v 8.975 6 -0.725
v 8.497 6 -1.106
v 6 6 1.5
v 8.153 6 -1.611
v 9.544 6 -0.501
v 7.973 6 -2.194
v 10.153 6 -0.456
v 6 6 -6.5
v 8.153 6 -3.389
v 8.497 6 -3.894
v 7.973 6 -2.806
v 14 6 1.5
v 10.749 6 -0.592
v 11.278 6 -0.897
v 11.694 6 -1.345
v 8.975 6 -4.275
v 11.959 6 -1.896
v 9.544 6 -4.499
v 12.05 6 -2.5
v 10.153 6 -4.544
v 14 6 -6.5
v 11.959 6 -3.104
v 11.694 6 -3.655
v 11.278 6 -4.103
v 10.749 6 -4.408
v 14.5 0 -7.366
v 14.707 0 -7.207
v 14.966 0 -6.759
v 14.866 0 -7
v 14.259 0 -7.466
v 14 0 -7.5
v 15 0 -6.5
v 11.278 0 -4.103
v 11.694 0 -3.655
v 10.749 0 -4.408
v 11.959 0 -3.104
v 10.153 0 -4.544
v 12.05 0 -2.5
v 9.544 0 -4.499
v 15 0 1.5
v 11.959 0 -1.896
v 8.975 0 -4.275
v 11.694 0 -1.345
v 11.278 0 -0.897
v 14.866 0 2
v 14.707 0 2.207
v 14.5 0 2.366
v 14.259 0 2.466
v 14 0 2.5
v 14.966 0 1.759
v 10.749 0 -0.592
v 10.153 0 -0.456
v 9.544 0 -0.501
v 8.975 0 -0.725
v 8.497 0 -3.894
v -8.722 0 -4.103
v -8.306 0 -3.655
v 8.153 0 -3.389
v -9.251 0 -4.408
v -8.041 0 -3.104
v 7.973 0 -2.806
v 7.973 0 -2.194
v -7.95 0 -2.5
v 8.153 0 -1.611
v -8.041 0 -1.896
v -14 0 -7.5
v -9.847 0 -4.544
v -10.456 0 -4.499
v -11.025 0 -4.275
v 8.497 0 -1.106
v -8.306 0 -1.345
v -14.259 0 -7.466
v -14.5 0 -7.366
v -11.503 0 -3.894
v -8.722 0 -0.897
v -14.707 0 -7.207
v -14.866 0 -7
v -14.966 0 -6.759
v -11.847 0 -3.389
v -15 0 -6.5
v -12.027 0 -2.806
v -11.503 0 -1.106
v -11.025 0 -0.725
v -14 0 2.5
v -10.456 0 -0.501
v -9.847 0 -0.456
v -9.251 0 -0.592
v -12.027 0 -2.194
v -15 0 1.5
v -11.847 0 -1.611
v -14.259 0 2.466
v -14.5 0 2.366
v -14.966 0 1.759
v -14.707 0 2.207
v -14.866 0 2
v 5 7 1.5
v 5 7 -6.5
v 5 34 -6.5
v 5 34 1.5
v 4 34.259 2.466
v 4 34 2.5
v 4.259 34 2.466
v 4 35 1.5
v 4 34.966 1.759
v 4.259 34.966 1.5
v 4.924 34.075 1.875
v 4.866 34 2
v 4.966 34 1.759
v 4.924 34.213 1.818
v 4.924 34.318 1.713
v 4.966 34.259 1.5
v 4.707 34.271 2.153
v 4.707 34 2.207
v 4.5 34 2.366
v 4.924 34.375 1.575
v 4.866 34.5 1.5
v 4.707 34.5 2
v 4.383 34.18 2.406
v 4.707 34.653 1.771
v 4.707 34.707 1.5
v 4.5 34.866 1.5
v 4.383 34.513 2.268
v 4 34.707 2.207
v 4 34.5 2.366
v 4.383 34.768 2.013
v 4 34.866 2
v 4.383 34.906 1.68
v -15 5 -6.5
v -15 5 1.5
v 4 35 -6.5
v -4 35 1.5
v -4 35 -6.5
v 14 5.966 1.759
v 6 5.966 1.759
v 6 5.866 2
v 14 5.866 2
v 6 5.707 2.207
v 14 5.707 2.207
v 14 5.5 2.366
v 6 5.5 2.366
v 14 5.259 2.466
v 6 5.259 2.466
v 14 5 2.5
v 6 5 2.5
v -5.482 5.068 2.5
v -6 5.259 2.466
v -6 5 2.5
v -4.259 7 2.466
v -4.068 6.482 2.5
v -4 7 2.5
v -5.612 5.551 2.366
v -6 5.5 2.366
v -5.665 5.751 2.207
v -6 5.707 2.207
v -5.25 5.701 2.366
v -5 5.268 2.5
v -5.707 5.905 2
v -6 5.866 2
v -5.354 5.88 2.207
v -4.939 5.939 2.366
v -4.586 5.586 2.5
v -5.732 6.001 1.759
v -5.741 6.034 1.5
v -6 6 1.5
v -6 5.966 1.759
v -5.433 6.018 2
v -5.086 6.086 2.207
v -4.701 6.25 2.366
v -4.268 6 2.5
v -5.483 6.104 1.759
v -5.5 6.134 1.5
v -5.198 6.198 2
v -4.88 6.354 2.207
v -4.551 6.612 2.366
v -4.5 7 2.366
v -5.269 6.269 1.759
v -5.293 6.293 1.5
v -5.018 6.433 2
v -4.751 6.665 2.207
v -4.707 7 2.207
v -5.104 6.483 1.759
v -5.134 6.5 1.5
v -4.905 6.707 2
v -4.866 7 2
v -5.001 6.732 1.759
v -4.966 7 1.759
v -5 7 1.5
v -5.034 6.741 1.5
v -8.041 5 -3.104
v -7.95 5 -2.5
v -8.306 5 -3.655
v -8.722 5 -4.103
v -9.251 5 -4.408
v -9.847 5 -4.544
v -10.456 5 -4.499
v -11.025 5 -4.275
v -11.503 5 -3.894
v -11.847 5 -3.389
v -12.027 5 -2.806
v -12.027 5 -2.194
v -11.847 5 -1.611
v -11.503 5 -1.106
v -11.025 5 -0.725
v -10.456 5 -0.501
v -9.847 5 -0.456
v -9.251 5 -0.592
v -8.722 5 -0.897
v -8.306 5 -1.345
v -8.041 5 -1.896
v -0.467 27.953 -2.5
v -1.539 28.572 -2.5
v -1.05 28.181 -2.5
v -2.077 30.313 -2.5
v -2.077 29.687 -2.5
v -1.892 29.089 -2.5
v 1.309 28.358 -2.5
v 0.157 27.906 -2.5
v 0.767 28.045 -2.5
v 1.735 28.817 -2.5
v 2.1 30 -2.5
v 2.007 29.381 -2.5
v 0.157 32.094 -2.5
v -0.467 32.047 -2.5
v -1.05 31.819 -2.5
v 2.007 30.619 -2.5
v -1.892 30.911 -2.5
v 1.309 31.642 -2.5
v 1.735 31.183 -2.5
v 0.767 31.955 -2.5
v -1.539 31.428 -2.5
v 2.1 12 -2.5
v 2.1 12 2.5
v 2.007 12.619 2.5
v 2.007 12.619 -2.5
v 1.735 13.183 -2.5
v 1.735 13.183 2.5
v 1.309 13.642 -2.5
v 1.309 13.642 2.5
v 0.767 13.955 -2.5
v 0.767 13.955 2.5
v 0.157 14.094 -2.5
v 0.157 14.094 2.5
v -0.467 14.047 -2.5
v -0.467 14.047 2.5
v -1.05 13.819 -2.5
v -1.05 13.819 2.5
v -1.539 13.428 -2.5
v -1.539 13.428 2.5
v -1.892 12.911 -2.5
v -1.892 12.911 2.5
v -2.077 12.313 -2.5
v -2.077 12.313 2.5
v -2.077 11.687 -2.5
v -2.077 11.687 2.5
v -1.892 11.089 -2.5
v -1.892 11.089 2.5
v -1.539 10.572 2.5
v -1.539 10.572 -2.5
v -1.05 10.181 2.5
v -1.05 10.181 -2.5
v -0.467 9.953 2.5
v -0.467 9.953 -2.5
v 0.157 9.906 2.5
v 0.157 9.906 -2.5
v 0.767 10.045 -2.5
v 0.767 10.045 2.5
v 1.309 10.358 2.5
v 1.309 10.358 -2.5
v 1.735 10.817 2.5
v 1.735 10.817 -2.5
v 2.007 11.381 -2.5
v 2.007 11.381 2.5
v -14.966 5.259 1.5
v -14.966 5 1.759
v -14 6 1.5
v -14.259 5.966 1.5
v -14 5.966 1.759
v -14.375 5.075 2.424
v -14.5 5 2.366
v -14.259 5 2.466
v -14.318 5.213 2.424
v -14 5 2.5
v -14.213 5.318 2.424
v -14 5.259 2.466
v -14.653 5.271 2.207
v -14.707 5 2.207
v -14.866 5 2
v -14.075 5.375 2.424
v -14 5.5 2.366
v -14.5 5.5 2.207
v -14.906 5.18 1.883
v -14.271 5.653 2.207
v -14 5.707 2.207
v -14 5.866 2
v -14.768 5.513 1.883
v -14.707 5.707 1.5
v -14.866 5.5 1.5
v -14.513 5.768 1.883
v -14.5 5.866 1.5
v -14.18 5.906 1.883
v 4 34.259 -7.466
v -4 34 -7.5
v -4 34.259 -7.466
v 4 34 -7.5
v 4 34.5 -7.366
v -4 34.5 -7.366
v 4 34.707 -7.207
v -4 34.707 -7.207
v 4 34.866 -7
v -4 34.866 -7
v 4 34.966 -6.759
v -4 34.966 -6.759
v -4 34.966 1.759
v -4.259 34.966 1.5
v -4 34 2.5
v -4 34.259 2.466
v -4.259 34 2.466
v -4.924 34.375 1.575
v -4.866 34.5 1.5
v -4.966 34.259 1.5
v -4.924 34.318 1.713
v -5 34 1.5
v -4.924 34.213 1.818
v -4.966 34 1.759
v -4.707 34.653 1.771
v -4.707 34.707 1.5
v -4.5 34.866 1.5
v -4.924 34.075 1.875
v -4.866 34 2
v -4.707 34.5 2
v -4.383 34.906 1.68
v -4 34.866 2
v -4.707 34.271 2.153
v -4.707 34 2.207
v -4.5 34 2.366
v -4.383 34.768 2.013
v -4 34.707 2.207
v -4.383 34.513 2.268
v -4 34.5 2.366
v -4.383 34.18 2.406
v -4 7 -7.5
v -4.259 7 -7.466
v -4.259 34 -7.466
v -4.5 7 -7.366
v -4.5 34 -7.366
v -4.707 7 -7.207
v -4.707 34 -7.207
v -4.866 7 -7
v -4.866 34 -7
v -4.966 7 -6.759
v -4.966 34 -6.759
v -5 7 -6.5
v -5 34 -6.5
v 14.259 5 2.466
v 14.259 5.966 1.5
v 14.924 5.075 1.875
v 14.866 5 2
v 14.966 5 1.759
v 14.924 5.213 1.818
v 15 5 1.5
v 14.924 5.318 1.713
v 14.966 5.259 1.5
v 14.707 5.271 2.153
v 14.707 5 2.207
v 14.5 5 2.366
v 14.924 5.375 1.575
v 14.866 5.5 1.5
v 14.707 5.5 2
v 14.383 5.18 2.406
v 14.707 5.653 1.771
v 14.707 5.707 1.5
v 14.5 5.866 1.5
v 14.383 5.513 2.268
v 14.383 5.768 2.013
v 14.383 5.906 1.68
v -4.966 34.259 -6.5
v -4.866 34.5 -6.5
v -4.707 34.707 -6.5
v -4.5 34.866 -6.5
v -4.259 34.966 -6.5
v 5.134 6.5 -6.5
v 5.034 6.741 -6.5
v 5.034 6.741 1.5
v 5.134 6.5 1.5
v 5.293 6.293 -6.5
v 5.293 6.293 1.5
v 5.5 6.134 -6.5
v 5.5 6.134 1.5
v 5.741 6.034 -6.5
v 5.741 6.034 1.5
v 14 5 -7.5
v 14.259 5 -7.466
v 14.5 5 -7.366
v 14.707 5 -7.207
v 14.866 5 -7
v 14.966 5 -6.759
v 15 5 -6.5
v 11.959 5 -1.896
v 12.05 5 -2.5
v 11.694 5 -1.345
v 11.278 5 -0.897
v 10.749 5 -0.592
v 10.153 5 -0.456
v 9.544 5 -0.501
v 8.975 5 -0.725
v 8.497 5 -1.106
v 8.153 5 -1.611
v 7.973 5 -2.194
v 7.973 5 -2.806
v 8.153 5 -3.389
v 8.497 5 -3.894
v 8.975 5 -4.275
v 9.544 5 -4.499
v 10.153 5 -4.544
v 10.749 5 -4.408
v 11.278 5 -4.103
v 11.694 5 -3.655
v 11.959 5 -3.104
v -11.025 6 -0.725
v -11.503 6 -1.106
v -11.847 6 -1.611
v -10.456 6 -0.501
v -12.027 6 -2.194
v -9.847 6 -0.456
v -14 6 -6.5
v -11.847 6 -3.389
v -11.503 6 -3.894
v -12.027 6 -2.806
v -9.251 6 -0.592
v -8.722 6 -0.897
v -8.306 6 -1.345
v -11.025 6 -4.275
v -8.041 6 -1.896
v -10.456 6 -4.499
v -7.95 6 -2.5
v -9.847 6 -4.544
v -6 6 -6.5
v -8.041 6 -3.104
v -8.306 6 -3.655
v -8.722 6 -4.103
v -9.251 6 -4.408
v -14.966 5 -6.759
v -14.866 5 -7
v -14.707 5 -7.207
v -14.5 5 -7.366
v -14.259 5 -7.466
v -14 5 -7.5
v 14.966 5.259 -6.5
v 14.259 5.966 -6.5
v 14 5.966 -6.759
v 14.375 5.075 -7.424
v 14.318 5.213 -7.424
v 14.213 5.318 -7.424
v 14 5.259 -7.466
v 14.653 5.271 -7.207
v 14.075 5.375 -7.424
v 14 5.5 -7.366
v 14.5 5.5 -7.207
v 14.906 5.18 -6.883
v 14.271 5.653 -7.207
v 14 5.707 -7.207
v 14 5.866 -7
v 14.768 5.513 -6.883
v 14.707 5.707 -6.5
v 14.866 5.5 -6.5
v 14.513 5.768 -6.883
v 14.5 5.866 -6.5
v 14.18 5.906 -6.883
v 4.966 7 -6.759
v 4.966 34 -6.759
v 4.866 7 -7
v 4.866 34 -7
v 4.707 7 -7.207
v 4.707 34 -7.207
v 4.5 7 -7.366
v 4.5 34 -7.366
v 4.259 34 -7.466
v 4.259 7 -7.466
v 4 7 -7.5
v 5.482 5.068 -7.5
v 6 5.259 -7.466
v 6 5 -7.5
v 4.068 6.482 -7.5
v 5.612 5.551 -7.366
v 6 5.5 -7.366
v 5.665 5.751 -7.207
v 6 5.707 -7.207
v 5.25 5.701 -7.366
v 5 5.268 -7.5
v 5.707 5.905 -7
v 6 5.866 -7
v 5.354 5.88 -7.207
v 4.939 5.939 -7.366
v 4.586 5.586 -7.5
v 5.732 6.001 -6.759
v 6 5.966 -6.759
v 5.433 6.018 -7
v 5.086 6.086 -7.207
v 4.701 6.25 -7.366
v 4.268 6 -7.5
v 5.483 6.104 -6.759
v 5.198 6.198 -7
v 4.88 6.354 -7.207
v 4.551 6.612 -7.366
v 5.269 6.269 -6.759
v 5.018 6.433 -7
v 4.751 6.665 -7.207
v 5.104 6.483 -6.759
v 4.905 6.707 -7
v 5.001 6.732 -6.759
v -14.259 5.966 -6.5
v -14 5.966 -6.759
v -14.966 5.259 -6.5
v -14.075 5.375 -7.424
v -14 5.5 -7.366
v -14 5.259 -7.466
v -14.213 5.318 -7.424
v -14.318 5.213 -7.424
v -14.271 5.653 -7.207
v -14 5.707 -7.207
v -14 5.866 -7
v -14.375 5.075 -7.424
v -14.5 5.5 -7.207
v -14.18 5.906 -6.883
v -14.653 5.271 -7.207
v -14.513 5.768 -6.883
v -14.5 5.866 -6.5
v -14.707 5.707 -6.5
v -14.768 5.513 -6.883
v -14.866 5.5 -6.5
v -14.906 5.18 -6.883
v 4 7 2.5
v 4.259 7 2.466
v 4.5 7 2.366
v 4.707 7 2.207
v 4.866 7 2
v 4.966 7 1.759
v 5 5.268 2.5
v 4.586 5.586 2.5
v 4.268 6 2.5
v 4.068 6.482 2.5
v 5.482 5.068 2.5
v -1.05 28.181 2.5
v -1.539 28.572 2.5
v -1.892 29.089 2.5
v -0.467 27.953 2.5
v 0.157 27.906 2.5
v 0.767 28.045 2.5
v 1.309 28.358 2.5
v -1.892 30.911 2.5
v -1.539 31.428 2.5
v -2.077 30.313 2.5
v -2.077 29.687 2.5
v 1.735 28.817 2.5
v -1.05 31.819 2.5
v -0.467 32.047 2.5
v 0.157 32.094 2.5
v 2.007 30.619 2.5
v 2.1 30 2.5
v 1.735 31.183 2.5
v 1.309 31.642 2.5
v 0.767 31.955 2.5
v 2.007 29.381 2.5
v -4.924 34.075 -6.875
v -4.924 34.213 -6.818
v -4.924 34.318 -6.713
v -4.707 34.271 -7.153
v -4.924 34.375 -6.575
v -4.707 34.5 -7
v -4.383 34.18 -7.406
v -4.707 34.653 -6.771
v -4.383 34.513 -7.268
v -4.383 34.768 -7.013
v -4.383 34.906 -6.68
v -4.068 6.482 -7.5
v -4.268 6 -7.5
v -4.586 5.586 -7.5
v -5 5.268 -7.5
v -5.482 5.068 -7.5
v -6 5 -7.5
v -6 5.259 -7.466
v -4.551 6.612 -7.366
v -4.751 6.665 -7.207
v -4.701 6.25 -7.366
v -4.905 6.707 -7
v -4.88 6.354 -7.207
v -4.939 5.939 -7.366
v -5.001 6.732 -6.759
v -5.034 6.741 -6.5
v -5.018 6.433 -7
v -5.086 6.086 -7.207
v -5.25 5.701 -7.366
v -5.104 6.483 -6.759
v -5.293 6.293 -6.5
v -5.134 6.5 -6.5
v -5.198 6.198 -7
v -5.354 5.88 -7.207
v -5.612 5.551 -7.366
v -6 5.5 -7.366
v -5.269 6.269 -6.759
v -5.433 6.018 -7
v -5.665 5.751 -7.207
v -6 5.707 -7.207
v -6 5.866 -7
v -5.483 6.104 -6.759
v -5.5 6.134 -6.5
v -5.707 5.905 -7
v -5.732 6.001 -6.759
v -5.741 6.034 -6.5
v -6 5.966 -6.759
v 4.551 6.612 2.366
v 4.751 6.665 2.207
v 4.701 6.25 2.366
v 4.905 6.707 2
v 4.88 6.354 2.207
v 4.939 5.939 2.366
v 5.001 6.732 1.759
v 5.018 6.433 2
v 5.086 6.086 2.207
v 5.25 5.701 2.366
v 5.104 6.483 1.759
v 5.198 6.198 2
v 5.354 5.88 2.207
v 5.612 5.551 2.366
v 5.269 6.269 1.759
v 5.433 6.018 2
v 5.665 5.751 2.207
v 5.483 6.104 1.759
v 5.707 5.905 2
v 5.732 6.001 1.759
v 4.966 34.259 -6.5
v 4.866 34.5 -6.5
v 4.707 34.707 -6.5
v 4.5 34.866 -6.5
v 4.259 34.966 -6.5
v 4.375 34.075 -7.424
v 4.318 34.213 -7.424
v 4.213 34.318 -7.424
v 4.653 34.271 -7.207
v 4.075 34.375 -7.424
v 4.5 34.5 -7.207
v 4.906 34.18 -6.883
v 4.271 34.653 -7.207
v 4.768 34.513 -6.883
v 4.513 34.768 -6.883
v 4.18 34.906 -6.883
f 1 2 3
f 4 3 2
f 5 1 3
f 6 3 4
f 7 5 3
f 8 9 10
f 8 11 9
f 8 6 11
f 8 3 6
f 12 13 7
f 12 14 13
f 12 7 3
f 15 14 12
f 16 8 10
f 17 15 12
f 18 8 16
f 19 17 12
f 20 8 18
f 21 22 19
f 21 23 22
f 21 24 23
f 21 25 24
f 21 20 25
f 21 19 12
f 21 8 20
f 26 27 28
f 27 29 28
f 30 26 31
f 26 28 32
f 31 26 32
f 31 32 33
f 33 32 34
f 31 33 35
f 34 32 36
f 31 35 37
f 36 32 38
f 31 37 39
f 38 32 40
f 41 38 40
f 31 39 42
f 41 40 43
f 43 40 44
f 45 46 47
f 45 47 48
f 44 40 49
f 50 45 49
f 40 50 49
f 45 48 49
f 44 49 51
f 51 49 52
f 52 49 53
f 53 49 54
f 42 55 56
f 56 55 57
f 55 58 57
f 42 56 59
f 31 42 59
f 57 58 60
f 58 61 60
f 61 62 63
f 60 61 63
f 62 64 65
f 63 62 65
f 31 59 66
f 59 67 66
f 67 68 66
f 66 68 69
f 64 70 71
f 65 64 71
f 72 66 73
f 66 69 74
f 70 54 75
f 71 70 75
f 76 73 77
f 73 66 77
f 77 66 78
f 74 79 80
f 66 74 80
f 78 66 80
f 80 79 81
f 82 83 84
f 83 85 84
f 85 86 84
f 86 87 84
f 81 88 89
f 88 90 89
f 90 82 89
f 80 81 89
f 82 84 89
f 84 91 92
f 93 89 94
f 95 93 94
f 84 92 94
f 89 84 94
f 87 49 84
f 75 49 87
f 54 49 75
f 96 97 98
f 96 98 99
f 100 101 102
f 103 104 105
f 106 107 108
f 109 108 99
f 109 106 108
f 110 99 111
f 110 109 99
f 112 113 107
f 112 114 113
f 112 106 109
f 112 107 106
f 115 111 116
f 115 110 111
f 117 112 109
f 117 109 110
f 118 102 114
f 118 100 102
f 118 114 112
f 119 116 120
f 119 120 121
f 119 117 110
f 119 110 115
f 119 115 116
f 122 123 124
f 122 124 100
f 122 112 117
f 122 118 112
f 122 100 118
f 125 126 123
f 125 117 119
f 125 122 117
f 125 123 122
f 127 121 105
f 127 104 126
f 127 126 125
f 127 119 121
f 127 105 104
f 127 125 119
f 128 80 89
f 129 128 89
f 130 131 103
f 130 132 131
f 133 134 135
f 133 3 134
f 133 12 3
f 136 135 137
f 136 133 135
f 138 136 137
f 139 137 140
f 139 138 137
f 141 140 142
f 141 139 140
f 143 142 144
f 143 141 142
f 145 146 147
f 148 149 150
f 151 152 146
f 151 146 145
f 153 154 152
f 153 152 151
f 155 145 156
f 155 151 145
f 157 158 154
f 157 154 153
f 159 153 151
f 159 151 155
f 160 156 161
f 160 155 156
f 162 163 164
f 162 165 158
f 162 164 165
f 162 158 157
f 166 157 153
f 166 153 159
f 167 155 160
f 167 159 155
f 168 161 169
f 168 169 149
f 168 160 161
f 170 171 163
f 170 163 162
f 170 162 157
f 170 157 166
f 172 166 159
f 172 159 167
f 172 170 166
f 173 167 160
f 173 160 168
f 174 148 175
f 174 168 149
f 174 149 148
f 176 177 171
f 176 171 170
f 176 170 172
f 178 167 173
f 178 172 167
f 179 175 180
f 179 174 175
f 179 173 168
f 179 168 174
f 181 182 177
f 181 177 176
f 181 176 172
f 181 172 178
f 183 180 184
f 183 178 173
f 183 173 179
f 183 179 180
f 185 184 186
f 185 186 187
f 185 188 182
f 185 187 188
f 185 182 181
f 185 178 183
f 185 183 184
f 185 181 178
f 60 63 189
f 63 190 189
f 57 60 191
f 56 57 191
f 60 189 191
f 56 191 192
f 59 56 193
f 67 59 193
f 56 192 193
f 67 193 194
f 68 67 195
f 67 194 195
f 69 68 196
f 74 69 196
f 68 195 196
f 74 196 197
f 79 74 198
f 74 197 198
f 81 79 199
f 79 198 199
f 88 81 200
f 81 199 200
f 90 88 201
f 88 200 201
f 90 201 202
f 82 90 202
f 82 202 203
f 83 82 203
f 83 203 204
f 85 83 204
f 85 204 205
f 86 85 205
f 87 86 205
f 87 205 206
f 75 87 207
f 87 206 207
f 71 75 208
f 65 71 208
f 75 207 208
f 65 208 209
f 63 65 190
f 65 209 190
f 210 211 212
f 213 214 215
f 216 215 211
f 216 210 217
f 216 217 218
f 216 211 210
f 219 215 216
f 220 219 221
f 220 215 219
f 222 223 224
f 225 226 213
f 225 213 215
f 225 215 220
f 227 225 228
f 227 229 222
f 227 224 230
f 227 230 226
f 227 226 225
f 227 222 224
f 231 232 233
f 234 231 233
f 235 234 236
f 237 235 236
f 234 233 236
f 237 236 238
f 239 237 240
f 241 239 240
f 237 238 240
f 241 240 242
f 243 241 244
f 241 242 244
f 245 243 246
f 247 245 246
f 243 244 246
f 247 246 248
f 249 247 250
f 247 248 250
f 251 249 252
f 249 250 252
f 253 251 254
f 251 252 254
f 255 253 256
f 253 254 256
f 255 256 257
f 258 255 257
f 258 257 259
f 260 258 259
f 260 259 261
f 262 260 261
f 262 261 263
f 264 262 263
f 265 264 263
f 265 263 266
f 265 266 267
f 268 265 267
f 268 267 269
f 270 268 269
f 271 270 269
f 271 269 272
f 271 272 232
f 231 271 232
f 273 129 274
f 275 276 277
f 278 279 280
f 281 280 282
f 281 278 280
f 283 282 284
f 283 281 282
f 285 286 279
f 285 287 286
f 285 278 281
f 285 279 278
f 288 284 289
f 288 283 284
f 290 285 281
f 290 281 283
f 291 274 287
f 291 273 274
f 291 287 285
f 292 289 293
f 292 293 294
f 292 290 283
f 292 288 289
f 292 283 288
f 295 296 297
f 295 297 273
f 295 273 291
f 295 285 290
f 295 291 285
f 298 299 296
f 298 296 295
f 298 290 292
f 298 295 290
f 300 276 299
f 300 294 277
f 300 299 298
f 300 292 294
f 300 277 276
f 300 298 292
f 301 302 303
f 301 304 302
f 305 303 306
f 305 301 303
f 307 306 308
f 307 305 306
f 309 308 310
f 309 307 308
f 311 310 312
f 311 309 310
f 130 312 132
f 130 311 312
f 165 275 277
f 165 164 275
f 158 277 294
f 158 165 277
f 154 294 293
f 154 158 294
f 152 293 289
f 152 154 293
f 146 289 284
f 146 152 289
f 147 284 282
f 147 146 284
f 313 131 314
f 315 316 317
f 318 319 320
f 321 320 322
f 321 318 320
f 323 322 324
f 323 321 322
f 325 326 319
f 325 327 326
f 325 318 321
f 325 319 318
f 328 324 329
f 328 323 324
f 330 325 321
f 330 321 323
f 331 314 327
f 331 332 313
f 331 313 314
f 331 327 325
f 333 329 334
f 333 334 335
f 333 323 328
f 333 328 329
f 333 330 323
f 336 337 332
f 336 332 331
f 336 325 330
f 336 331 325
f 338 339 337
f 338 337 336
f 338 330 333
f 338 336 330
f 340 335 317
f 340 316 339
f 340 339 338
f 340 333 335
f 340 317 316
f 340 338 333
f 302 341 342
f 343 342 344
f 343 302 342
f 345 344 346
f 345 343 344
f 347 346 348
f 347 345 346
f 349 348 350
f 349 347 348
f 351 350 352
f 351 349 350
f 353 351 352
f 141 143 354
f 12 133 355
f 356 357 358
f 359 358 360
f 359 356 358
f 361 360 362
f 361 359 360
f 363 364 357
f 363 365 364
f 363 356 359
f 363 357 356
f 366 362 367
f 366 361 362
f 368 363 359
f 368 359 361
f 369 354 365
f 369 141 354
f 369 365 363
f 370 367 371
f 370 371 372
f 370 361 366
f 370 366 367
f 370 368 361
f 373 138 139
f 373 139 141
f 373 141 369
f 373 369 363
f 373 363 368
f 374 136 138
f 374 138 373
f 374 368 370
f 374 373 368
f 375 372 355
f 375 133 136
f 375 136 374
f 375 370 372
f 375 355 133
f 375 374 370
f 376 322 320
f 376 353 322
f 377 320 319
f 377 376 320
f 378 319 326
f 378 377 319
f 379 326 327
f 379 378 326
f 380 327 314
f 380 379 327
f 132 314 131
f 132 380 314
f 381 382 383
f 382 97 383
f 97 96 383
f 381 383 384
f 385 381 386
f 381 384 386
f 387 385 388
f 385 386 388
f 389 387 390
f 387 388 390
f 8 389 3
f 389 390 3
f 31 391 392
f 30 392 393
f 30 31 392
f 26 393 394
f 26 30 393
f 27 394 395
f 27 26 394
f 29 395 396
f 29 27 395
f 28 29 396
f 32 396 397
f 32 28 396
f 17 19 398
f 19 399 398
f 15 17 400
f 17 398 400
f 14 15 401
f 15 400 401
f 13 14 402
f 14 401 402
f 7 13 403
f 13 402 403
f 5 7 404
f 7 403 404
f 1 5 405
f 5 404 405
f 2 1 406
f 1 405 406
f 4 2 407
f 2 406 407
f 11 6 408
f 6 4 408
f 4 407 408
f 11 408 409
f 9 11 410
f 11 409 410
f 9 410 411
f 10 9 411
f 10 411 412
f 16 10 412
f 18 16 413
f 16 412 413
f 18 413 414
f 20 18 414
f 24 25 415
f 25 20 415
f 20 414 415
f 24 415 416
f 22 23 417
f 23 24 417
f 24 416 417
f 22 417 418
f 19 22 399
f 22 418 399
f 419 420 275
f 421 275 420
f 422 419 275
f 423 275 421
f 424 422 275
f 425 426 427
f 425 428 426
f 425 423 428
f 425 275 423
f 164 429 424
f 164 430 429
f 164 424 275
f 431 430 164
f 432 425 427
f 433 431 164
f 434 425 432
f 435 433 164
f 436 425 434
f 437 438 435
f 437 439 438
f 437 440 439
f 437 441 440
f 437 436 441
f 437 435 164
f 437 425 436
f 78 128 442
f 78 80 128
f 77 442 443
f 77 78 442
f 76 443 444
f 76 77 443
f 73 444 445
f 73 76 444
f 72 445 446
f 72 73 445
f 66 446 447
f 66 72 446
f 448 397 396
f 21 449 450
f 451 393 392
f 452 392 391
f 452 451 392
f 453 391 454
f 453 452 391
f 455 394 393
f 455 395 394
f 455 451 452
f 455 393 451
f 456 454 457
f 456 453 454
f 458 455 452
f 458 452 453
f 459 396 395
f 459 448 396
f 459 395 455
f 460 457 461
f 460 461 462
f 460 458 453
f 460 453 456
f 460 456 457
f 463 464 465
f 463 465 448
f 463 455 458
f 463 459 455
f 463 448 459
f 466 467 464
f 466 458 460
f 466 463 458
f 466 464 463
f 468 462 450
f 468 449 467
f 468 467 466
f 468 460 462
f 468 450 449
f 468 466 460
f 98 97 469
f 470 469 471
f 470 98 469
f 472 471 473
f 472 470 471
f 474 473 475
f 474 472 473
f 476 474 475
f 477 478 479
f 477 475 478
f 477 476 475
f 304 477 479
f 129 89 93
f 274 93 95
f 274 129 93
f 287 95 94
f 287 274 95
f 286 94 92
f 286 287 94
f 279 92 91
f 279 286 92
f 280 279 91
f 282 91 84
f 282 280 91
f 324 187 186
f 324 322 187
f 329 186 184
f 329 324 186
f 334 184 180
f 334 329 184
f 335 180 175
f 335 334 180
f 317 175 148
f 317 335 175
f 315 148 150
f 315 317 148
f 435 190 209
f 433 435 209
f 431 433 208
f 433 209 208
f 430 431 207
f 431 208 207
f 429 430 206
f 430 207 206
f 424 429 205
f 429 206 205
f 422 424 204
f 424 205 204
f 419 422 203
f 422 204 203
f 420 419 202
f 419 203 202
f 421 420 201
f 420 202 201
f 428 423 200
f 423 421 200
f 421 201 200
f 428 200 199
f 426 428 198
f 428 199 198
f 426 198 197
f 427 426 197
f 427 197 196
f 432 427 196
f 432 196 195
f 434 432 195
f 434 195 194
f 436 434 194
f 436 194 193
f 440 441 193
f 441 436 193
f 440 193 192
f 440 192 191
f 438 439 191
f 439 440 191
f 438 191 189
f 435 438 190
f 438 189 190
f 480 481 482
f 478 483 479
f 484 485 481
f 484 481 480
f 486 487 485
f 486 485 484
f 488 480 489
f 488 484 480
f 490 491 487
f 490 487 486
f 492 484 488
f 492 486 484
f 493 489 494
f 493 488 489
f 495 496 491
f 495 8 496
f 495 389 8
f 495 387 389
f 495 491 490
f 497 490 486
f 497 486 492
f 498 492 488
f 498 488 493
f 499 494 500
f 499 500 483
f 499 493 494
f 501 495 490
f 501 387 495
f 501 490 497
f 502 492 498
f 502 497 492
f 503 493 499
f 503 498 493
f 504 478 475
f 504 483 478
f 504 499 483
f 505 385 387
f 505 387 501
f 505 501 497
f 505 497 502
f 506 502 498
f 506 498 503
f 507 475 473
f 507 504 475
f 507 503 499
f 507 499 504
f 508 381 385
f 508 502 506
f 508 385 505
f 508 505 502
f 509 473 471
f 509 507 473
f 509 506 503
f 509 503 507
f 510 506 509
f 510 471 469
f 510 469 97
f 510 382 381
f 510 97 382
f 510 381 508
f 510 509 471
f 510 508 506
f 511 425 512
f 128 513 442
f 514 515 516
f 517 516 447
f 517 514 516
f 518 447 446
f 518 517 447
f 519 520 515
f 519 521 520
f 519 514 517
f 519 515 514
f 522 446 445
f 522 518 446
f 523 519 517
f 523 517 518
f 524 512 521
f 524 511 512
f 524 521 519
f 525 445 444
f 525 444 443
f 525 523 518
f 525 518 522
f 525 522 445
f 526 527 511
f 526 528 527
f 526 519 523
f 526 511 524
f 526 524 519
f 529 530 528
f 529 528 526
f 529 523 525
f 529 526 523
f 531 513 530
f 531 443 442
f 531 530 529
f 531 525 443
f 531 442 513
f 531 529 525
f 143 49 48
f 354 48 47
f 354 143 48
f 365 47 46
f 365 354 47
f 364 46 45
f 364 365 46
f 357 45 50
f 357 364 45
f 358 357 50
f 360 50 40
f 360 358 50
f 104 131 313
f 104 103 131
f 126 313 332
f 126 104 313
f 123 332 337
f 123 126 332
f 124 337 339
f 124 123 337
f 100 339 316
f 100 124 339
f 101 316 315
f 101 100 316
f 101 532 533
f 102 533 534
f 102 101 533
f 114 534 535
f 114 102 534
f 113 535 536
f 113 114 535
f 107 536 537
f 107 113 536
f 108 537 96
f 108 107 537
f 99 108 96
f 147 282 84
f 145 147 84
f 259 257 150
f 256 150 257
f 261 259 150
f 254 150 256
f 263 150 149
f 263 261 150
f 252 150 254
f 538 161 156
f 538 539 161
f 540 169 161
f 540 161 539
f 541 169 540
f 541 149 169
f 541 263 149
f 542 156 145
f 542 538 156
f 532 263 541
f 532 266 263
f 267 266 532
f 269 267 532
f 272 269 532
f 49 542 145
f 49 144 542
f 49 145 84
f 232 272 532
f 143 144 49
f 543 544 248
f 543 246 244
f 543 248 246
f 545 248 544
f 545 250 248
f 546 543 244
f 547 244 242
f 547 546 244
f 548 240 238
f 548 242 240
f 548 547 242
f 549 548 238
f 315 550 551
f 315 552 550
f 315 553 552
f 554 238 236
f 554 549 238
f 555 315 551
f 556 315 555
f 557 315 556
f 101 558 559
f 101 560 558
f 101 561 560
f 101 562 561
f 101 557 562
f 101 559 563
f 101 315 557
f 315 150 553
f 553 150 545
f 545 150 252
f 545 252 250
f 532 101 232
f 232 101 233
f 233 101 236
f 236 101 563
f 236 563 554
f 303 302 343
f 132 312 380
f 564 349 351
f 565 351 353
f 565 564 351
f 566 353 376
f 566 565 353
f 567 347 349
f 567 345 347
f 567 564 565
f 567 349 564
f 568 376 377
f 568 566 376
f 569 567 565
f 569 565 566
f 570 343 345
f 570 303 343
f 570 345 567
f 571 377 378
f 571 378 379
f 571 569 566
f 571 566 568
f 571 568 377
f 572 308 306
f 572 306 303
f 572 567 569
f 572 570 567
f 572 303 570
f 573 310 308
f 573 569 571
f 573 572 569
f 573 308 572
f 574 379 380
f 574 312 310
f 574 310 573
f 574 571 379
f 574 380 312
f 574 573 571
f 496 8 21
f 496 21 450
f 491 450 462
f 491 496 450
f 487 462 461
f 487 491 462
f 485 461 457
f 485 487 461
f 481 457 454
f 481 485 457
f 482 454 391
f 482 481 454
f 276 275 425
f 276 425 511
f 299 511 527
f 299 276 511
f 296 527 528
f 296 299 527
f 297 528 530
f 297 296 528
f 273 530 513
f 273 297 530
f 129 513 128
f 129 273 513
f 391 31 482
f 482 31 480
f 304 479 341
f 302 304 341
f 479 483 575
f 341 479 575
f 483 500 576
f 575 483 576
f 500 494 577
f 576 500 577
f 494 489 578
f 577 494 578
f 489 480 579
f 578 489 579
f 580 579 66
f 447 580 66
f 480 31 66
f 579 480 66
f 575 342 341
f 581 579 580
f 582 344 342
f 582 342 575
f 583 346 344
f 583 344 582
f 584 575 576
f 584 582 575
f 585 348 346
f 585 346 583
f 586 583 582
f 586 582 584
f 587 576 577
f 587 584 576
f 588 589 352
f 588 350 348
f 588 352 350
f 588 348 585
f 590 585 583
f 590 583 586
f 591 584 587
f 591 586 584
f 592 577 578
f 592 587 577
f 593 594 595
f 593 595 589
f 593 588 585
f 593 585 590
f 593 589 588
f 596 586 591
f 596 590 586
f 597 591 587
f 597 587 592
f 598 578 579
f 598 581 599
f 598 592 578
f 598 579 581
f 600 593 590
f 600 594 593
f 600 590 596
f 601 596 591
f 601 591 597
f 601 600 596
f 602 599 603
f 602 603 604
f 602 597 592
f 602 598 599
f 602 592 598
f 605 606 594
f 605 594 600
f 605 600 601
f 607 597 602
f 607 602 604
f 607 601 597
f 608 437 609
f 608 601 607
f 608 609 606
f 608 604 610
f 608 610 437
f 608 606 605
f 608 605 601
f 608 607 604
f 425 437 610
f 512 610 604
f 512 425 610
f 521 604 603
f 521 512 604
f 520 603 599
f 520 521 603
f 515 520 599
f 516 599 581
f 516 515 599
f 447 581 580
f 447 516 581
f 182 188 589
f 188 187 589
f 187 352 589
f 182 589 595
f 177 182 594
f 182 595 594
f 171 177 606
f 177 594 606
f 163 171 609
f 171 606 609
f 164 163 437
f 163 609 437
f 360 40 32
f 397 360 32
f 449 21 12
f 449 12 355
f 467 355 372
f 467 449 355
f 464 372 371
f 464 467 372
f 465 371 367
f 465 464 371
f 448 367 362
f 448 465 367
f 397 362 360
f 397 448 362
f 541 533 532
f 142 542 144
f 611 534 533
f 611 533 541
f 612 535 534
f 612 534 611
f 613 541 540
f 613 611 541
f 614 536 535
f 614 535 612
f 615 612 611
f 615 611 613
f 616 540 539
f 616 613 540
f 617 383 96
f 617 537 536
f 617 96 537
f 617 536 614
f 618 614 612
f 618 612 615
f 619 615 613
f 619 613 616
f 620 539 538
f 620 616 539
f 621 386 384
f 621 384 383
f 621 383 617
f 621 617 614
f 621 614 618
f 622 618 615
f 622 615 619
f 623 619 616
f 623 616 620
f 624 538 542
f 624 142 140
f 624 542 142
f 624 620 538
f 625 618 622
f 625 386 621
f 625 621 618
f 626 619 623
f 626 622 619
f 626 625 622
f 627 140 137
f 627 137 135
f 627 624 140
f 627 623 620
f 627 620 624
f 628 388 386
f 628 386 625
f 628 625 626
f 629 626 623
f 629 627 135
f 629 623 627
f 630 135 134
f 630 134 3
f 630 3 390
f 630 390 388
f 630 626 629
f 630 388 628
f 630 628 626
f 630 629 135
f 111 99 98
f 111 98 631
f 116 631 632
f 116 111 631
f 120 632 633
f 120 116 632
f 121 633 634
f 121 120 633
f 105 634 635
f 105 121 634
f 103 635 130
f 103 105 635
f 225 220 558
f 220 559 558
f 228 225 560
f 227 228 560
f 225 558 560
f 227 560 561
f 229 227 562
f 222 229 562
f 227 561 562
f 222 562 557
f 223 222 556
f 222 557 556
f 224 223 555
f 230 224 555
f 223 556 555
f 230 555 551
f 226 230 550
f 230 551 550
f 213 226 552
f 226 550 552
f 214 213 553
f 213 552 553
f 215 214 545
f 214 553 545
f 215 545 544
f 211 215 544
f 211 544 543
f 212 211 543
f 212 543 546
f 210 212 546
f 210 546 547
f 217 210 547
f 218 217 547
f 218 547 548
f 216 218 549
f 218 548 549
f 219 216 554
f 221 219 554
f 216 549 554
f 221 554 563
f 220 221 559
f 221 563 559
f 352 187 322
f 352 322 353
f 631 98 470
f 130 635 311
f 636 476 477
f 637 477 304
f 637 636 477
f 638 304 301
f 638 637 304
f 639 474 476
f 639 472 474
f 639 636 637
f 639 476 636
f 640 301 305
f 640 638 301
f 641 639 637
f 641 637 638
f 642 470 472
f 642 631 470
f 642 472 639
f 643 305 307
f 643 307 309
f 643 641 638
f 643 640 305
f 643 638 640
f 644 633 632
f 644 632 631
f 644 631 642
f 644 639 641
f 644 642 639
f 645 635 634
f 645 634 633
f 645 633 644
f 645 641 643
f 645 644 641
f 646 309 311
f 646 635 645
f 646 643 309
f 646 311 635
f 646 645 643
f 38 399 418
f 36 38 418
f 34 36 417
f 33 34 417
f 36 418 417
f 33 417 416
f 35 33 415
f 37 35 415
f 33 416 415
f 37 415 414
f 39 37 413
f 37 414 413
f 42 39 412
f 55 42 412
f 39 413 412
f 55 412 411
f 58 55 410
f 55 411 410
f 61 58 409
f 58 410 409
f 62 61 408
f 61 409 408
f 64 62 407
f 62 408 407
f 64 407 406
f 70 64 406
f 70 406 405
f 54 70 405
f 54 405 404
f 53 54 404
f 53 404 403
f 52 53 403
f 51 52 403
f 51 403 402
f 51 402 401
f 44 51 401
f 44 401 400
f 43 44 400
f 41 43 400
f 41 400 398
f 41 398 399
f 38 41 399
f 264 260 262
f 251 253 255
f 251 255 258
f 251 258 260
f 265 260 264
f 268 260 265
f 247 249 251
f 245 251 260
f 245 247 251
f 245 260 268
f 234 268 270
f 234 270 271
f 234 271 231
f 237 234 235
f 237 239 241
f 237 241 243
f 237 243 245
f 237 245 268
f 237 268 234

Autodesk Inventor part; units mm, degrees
ref_plane "YZ Plane" through (0, 0, 0) normal (1, 0, 0) x (0, 1, 0)
ref_plane "XZ Plane" through (0, 0, 0) normal (0, 1, 0) x (-1, 0, 0)
ref_plane "XY Plane" through (0, 0, 0) normal (0, 0, 1) x (1, 0, 0)
sketch "Sketch1" plane through (0, 0, 0) normal (0, 1, 0) x (-1, 0, 0)
  line L0 (15, 7.5) -> (-15, 7.5)
  line L1 (-15, 7.5) -> (-15, -7.5)
  line L2 (-15, -7.5) -> (15, -7.5)
  line L3 (15, -7.5) -> (15, 7.5)
  line L4 (15, 7.5) -> (-15, -7.5) construction
  line L5 (-15, 7.5) -> (15, -7.5) construction
  point P0 (0, 0)
  dimension "d0" = 30
  dimension "d1" = 15
extrude "Extrusion1" add sketch "Sketch1" along normal blind 5
sketch "Sketch2" plane through (0, 5, 0) normal (0, 1, 0) x (1, 0, 0)
  line L0 (5, -7.5) -> (-5, -7.5)
  line L1 (-5, -7.5) -> (-5, 7.5)
  line L2 (-5, 7.5) -> (5, 7.5)
  line L3 (5, 7.5) -> (5, -7.5)
  line L4 (5, -7.5) -> (-5, 7.5) construction
  line L5 (-5, -7.5) -> (5, 7.5) construction
  point P0 (0, 0)
  dimension "d4" = 10
  dimension "d5" = 15
extrude "Extrusion2" add sketch "Sketch2" along normal blind 30
sketch "Sketch3" plane through (-15, 0, 7.5) normal (0, 0, 1) x (1, 0, 0)
  circle A0 centre (15, 12) radius 2.1
  line L0 (0, 0) -> (30, 0) projected
  point P0 (15, 0)
  dimension "d8" = 4.2
  dimension "d9" = 12
extrude "Extrusion3" cut sketch "Sketch3" against normal blind 10
sketch "Sketch4" plane through (0, 5, 0) normal (0, 1, 0) x (1, 0, 0)
  circle A0 centre (-10, 2.5) radius 2.05
  line L0 (-15, 7.5) -> (-15, -7.5) projected
  line L1 (15, 7.5) -> (-15, 7.5) projected
  circle A1 centre (10, 2.5) radius 2.05
  line L2 (15, -7.5) -> (15, 7.5) projected
  line L3 (15, 7.5) -> (-15, 7.5) projected
  point P0 (0, 0)
  point P1 (-5, 7.5)
  point P2 (-10, 7.5)
  point P3 (5, 7.5)
  dimension "d12" = 4.1
  dimension "d13" = 5
  dimension "d14" = 5
  dimension "d15" = 4.1
  dimension "d16" = 5
  dimension "d17" = 5
extrude "Extrusion4" cut sketch "Sketch4" against normal through all
sketch "Sketch5" plane through (-15, 0, 7.5) normal (0, 0, 1) x (1, 0, 0)
  circle A0 centre (15, 30) radius 2.1
  line L0 (10, 35) -> (20, 35) projected
  point P0 (15, 0)
  dimension "d20" = 4.2
  dimension "d21" = 5
extrude "Extrusion5" cut sketch "Sketch5" against normal blind 10
sketch "Sketch8" plane through (-15, 0, 7.5) normal (0, 0, 1) x (1, 0, 0)
  circle A0 centre (15, 30) radius 2.1 projected
  circle A1 centre (15, 12) radius 2.1 projected
  circle A2 centre (15, 30) radius 2.1
  circle A3 centre (15, 12) radius 2.1
  circle A4 centre (15, 30) radius 2.1 projected
  circle A5 centre (15, 12) radius 2.1 projected
  line L0 (0, 0) -> (30, 0) projected
  line L1 (30, 0) -> (30, 5) projected
  line L2 (20, 5) -> (30, 5) projected
  line L3 (20, 5) -> (20, 35) projected
  line L4 (10, 35) -> (20, 35) projected
  line L5 (10, 5) -> (10, 35) projected
  line L6 (0, 5) -> (10, 5) projected
  line L7 (0, 0) -> (0, 5) projected
  line L8 (10, 35) -> (10, 5)
  line L9 (0, 5) -> (0, 0)
  line L10 (30, 0) -> (30, 5)
  line L11 (20, 5) -> (20, 35)
  point P0 (15, 0)
extrude "Extrusion7" cut sketch "Sketch8" against normal blind 5
sketch "Sketch9" plane through (0, 5, 0) normal (0, 1, 0) x (1, 0, 0)
  line L0 (-15, -2.5) -> (-5, -2.5) projected
  line L1 (-5, -2.5) -> (-5, 7.5) projected
  line L2 (-5, 7.5) -> (-15, 7.5) projected
  line L3 (-15, 7.5) -> (-15, -2.5) projected
  circle A0 centre (-10, 2.5) radius 2.05 projected
  line L4 (5, -2.5) -> (15, -2.5) projected
  line L5 (15, -2.5) -> (15, 7.5) projected
  line L6 (15, 7.5) -> (5, 7.5) projected
  line L7 (5, 7.5) -> (5, -2.5) projected
  circle A1 centre (10, 2.5) radius 2.05 projected
  point P0 (0, 0)
extrude "Extrusion8" add sketch "Sketch9" along normal blind 1
fillet "Fillet1" radius 1 20 edges at (0, 35, 2.5) (5, 35, -2.5) (0, 35, -7.5) (-5, 35, -2.5) (5, 20.5, 2.5) (5, 20.5, -7.5) (-5, 20.5, 2.5) (-5, 20.5, -7.5) (5, 6, -2.5) (-5, 6, -2.5) (-15, 6, -2.5) (-10, 6, 2.5) (10, 6, 2.5) (15, 6, -2.5) (10, 6, -7.5) (-10, 6, -7.5) (15, 3, 2.5) (15, 3, -7.5) (-15, 3, 2.5) (-15, 3, -7.5)
properties part number "al_rod_bracket" material "ABS Plastic"
